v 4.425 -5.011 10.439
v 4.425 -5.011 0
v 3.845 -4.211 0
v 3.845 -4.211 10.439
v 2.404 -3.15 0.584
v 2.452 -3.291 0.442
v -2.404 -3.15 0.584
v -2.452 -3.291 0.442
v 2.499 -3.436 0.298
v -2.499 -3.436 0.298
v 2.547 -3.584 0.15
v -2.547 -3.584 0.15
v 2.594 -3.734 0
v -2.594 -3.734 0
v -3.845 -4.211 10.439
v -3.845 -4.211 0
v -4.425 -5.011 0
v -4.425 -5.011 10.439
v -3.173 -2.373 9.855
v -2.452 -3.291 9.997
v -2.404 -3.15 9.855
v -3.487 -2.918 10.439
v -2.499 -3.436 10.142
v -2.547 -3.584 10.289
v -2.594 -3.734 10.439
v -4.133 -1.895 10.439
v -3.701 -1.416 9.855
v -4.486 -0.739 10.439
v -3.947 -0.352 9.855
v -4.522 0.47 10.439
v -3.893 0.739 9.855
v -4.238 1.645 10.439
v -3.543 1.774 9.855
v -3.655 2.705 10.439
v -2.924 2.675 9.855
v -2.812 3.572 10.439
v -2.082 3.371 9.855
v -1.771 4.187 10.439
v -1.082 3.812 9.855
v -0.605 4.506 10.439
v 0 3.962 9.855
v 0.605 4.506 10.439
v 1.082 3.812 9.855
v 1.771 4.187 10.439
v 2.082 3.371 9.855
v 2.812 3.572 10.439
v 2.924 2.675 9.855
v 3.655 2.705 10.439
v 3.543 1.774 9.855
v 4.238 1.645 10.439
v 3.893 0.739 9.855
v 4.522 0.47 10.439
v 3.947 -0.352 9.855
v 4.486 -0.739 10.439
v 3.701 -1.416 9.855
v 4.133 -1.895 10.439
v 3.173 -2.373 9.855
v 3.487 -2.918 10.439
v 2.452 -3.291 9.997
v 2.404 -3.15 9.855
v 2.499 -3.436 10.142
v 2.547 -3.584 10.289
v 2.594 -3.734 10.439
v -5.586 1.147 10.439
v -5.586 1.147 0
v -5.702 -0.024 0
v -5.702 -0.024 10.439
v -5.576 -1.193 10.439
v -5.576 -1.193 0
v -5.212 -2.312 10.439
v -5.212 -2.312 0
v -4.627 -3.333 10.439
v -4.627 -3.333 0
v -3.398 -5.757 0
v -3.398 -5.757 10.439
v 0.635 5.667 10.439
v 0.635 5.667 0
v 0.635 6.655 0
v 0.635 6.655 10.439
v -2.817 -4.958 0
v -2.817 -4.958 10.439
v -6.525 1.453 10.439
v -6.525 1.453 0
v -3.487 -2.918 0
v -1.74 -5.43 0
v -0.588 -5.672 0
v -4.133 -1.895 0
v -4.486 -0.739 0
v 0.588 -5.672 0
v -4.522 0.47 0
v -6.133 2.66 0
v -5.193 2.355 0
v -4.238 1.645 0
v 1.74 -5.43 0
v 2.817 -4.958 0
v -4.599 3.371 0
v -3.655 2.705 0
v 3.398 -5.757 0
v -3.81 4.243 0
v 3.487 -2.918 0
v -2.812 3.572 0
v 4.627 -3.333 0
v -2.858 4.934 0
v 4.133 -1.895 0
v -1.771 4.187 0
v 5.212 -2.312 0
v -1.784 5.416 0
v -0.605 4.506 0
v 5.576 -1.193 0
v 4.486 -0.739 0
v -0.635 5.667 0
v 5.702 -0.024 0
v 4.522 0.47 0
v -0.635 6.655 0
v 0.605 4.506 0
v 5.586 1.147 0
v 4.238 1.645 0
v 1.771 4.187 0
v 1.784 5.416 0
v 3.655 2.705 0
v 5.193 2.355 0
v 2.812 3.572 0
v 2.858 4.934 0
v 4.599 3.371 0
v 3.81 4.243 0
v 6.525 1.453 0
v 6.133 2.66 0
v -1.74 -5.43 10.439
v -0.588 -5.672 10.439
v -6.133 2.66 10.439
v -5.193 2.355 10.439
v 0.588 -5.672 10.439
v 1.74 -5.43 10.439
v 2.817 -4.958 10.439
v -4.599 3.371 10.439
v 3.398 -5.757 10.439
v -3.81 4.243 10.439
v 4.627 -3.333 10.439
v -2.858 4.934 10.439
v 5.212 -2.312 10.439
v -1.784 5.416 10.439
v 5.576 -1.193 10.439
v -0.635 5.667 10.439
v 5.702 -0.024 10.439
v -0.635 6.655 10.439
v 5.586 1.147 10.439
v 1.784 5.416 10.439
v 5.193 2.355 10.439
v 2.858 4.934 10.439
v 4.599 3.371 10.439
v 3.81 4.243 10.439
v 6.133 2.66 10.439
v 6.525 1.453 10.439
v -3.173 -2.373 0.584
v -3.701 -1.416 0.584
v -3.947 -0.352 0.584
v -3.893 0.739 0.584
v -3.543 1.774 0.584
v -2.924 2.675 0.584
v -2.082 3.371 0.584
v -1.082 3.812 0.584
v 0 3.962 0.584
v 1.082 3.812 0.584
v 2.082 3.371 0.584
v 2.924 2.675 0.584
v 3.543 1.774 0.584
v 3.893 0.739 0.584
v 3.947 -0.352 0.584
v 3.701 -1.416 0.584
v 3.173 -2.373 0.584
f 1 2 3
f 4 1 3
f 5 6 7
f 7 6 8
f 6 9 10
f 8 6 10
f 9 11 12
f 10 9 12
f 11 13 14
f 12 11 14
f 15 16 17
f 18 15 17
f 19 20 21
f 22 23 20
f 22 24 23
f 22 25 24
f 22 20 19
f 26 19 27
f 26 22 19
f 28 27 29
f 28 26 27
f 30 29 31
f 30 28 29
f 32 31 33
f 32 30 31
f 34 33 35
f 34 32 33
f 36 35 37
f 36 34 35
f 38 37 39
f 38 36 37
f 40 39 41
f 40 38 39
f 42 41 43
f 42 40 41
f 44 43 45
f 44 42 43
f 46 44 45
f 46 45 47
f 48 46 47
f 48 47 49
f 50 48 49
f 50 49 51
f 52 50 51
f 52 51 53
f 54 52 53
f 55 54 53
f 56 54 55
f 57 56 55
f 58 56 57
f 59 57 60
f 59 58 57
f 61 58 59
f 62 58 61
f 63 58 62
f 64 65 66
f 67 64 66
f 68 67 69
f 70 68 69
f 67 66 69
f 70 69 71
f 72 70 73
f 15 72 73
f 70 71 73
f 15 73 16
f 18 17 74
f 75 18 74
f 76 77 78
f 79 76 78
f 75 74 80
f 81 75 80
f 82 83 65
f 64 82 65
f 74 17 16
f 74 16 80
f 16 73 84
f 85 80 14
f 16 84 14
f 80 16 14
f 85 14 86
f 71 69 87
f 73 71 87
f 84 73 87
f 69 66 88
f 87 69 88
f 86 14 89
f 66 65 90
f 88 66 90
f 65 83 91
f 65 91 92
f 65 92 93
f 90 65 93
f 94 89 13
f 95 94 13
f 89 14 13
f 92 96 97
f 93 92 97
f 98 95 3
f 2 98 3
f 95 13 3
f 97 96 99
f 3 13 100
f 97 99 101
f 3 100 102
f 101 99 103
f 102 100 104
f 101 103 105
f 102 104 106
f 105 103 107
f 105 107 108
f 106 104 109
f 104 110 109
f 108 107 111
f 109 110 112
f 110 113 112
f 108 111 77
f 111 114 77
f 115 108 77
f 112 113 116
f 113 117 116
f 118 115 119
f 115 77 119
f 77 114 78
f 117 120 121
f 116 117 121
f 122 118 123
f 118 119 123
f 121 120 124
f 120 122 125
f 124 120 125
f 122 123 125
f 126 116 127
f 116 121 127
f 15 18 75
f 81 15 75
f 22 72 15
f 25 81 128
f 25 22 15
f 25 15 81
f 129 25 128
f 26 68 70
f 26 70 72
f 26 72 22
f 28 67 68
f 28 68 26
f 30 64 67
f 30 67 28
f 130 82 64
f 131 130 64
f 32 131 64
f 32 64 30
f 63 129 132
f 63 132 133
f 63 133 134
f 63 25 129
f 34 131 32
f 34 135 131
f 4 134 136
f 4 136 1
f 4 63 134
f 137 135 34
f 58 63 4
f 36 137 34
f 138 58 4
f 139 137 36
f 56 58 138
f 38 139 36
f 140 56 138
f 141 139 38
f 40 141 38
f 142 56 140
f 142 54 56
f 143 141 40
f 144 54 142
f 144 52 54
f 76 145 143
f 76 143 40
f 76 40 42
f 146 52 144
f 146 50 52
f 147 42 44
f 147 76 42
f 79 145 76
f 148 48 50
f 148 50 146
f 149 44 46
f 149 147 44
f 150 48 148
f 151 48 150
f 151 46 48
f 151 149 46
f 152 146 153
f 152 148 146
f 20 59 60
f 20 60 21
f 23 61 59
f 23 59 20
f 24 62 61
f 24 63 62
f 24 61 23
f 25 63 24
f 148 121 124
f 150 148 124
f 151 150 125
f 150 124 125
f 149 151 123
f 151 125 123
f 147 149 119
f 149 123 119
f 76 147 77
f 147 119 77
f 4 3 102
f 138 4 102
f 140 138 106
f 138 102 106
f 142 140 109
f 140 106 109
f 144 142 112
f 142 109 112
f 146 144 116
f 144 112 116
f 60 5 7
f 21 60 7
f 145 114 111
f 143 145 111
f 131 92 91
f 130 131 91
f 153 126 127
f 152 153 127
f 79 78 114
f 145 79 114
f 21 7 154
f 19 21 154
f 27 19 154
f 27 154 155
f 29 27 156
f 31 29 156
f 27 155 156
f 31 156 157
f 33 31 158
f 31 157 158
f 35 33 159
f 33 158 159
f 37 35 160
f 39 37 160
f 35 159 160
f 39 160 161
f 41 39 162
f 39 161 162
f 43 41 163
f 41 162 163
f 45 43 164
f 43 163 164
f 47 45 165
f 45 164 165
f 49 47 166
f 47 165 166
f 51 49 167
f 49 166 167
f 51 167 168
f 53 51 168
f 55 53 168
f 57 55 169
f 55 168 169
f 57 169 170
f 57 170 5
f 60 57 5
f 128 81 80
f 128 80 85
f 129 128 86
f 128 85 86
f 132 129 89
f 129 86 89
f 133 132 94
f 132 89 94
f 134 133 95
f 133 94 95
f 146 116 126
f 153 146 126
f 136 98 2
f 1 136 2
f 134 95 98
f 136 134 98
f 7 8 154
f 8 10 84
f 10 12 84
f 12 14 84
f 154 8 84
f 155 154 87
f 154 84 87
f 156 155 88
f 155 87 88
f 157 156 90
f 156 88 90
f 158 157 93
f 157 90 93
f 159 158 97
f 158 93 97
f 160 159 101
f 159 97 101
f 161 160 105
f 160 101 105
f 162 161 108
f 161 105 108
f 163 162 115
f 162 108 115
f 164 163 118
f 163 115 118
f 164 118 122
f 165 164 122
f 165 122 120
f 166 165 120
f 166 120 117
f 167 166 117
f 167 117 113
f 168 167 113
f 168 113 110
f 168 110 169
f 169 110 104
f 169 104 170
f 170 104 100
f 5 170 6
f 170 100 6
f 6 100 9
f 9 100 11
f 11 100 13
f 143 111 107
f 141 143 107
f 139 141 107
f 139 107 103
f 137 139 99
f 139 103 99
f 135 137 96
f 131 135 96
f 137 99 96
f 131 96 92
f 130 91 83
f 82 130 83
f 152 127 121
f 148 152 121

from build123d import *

# Parameters (mm, degrees)
F1_DEPTH = 10.4394
F2_SIZE  = 0.5842


with BuildPart() as f1:
    # F0 (on Top) → F1 (new body)
    with BuildSketch(Plane.XY):
        with BuildLine():
            Line((-6.525317, 1.452525), (-5.585705, 1.147227))
            ThreePointArc((-5.585705, 1.147227), (-5.42321, -1.762108), (-3.844607, -4.211321))
            Line((-3.844607, -4.211321), (-4.425319, -5.010603))
            Line((-4.425319, -5.010603), (-3.397868, -5.75709))
            Line((-3.397868, -5.75709), (-2.817155, -4.957808))
            ThreePointArc((-2.817155, -4.957808), (0, -5.7023), (2.817155, -4.957808))
            Line((2.817155, -4.957808), (3.397868, -5.75709))
            Line((3.397868, -5.75709), (4.425319, -5.010603))
            Line((4.425319, -5.010603), (3.844607, -4.211321))
            ThreePointArc((3.844607, -4.211321), (5.42321, -1.762108), (5.585705, 1.147227))
            Line((5.585705, 1.147227), (6.525317, 1.452525))
            Line((6.525317, 1.452525), (6.132865, 2.660367))
            Line((6.132865, 2.660367), (5.193253, 2.355069))
            ThreePointArc((5.193253, 2.355069), (3.351728, 4.613258), (0.635, 5.666833))
            Line((0.635, 5.666833), (0.635, 6.6548))
            Line((0.635, 6.6548), (-0.635, 6.6548))
            Line((-0.635, 6.6548), (-0.635, 5.666833))
            ThreePointArc((-0.635, 5.666833), (-3.351728, 4.613258), (-5.193253, 2.355069))
            Line((-5.193253, 2.355069), (-6.132865, 2.660367))
            Line((-6.132865, 2.660367), (-6.525317, 1.452525))
        make_face()
        with BuildLine():
            ThreePointArc((-2.404295, -3.1496), (0, 3.9624), (2.404295, -3.1496))
            Line((2.404295, -3.1496), (-2.404295, -3.1496))
        make_face(mode=Mode.SUBTRACT)
    extrude(amount=F1_DEPTH)

    # F2
    f2_edges = [f1.edges().sort_by_distance(p)[0] for p in [
        (0, 3.9624, 10.4394),
        (0, -3.1496, 10.4394),
        (0, -3.1496, 0),
        (0, 3.9624, 0),
    ]]
    chamfer(f2_edges, length=F2_SIZE)


solid = f1.part
